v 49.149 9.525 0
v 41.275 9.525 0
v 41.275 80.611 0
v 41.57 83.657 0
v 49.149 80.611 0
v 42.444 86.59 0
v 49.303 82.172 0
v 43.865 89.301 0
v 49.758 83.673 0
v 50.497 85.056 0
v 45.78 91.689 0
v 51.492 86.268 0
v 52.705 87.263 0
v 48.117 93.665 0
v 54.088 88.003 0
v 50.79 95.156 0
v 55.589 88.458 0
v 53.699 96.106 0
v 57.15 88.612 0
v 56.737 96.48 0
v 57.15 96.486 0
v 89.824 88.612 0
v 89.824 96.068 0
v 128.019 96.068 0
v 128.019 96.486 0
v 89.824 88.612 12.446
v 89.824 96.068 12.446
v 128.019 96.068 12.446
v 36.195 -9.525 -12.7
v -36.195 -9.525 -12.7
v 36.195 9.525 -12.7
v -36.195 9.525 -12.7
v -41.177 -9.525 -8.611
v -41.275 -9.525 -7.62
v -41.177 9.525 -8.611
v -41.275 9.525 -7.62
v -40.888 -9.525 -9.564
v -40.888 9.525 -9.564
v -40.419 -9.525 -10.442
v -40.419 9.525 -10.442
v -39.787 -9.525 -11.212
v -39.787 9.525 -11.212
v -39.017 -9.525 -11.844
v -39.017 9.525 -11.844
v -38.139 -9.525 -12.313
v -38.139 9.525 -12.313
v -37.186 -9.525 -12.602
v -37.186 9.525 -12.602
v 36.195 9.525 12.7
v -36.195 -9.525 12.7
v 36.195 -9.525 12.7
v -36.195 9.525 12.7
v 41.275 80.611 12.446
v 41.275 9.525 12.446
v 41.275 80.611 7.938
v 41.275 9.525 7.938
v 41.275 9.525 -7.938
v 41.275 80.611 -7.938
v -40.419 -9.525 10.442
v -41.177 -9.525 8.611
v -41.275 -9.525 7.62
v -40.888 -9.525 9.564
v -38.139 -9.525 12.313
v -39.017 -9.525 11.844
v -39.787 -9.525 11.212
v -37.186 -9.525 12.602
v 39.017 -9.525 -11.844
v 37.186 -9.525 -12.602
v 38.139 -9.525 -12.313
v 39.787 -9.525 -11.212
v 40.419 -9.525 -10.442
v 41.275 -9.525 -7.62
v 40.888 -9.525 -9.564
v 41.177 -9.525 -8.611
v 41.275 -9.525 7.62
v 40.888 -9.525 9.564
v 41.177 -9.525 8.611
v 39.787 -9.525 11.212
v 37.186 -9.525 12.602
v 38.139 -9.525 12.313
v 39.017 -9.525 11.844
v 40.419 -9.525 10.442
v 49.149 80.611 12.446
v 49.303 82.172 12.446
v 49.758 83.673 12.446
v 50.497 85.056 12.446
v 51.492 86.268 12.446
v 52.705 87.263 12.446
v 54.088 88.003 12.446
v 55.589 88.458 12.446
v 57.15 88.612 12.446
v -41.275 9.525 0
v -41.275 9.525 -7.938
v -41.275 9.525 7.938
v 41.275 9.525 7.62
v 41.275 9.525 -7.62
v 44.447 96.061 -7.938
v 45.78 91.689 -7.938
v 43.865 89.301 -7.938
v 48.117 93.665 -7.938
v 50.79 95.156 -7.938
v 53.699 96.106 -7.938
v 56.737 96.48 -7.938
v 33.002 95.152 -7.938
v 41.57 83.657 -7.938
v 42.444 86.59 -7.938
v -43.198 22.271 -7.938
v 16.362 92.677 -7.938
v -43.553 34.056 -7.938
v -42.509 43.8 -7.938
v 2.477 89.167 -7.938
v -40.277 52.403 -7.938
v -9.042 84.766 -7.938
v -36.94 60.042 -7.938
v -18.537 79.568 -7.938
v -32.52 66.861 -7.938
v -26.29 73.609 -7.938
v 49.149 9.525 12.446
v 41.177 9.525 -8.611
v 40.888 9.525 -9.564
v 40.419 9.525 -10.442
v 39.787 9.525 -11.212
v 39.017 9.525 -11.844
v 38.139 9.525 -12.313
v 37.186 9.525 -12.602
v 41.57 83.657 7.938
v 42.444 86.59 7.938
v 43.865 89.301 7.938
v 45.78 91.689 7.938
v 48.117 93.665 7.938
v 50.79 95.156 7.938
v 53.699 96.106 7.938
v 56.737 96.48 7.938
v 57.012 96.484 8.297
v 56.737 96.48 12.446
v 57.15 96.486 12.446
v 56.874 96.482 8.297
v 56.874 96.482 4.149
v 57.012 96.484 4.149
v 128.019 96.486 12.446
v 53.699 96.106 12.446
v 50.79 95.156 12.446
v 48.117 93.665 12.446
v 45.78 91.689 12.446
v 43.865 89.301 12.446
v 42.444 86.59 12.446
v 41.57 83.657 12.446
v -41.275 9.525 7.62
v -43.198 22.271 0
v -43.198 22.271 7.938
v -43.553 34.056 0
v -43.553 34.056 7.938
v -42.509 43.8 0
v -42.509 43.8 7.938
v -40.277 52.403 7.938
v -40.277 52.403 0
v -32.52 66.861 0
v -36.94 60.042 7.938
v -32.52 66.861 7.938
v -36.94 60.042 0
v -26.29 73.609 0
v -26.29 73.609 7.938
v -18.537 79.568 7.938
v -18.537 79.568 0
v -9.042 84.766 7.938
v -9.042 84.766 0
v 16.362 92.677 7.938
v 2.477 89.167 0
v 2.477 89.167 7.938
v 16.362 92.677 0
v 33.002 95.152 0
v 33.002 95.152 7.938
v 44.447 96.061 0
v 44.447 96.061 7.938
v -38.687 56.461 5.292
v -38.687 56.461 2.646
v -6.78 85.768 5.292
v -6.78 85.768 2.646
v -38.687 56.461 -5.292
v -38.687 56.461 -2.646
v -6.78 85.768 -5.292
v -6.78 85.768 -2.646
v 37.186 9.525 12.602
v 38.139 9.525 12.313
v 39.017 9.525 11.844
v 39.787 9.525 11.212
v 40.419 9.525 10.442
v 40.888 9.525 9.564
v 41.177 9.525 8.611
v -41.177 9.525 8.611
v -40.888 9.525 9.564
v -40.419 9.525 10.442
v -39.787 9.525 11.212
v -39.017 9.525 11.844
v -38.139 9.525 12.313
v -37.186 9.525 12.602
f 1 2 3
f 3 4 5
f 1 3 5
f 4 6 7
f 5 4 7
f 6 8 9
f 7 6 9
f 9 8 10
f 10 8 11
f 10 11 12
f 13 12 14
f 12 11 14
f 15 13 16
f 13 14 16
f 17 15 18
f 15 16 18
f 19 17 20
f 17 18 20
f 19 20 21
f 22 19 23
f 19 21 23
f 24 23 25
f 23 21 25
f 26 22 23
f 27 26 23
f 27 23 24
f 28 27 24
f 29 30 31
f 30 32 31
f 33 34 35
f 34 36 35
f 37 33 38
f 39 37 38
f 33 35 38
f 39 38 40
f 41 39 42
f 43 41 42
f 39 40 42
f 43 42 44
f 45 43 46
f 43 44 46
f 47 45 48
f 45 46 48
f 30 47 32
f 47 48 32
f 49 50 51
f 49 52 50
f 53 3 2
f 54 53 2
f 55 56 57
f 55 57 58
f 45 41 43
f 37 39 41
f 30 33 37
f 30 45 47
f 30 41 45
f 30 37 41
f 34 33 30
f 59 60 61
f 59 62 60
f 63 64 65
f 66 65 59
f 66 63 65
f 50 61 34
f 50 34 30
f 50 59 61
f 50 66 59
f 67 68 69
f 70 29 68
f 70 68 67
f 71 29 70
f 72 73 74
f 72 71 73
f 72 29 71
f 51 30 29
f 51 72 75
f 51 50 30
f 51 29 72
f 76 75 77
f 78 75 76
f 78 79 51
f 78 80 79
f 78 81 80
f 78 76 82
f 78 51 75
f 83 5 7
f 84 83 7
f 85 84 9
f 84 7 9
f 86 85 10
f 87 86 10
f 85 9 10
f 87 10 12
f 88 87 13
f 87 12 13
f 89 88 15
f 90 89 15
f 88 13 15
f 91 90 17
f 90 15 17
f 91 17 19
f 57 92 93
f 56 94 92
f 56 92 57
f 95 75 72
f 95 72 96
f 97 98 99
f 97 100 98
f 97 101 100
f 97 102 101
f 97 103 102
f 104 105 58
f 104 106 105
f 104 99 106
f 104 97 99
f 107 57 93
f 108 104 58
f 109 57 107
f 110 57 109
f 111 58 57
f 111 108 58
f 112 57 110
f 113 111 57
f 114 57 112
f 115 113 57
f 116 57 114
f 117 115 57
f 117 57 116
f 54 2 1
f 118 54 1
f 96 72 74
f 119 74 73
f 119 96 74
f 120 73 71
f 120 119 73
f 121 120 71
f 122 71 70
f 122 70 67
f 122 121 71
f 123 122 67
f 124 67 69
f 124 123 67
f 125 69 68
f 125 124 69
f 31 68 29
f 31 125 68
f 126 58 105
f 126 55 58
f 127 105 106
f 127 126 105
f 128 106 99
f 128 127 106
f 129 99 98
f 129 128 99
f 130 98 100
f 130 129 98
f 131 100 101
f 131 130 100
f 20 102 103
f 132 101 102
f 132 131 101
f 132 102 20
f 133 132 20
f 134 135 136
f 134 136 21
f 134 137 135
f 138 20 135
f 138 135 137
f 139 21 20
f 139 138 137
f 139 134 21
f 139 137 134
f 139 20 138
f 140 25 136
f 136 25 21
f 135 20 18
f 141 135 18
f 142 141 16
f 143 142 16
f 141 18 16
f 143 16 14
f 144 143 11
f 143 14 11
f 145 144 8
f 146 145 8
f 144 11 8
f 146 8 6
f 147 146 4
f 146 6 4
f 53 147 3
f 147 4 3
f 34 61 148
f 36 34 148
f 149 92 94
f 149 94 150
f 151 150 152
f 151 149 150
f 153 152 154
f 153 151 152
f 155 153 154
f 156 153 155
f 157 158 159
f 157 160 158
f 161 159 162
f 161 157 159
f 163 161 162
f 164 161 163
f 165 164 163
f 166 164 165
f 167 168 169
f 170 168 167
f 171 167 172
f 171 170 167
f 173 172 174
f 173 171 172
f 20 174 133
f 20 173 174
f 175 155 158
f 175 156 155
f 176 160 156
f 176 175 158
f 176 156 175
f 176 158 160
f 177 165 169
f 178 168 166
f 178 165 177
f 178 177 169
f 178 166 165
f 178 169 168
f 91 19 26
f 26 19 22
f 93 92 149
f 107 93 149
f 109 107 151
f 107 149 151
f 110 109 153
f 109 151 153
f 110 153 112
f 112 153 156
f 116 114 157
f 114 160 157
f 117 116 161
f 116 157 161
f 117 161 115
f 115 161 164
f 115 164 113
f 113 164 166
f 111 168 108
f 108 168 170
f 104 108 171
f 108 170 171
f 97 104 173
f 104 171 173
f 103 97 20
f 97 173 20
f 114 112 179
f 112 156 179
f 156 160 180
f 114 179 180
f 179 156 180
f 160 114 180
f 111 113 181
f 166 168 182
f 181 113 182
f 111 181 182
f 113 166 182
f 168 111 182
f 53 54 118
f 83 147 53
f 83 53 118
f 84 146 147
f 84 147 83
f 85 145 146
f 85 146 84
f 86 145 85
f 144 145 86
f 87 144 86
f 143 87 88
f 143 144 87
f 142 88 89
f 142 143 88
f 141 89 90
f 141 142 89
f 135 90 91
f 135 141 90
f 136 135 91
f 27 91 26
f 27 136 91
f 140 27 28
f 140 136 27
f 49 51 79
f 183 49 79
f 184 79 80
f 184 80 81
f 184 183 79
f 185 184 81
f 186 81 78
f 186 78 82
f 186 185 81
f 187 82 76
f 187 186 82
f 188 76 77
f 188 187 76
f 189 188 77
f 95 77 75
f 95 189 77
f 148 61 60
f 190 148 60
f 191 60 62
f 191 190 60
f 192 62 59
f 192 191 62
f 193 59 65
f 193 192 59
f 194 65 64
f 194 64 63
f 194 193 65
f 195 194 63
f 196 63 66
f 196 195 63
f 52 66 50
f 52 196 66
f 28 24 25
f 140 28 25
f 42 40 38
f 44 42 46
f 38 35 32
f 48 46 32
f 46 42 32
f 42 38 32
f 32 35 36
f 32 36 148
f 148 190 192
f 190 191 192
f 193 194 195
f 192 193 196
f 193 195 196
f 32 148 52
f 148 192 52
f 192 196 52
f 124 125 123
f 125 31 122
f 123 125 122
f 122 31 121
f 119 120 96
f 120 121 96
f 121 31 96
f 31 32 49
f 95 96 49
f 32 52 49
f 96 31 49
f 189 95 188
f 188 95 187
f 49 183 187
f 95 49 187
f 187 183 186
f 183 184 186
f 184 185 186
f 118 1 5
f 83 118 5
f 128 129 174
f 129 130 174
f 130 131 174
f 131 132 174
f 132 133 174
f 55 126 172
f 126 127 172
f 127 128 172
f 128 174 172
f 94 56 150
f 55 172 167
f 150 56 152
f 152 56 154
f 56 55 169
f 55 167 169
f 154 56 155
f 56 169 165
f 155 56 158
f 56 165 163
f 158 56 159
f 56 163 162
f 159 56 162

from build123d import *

# Parameters (mm, degrees)
F0_W     = 82.55
F0_H     = 19.05
F1_DEPTH = 12.7
F2_DEPTH = 12.446
F3_DEPTH = 7.9375
F4_R     = 5.08


with BuildPart() as f1:
    # F0 (on Top) → F1 (new body, symmetric)
    with BuildSketch(Plane.XY):
        Rectangle(F0_W, F0_H)
    extrude(amount=F1_DEPTH, both=True)

    # F4
    f4_edges = [f1.edges().sort_by_distance(p)[0] for p in [
        (41.275, 0, 12.7),
        (41.275, 0, -12.7),
        (-41.275, 0, 12.7),
        (-41.275, 0, -12.7),
    ]]
    fillet(f4_edges, radius=F4_R)


with BuildPart() as f2:
    # F0 (on Top) → F2 (new body)
    with BuildSketch(Plane.XY):
        with BuildLine():
            Line((41.275, 80.61068), (41.275, 9.525))
            Line((41.275, 9.525), (49.149, 9.525))
            Line((49.149, 9.525), (49.149, 80.61068))
            ThreePointArc((49.149, 80.61068), (51.492439, 86.268242), (57.15, 88.61168))
            Line((57.15, 88.61168), (89.824399, 88.61168))
            Line((89.824399, 88.61168), (89.824399, 96.067605))
            Line((89.824399, 96.067605), (128.01899, 96.067605))
            Line((128.01899, 96.067605), (128.01899, 96.48568))
            Line((128.01899, 96.48568), (57.15, 96.48568))
            add(Edge.make_bspline(
                [(56.736729, 96.4803), (56.874336, 96.48218), (57.012093, 96.483974), (57.15, 96.48568)],
                knots=[131.1126, 131.1126, 131.1126, 131.1126, 131.337887, 131.337887, 131.337887, 131.337887], degree=3))
            ThreePointArc((56.736729, 96.4803), (45.779505, 91.688924), (41.275, 80.61068))
        make_face()
    extrude(amount=F2_DEPTH)


with BuildPart() as f3:
    # F0 (on Top) → F3 (new body, symmetric)
    with BuildSketch(Plane.XY):
        with BuildLine():
            add(Edge.make_bspline(
                [(-41.275, 9.525), (-52.583382, 64.954376), (-23.347816, 95.386158), (56.736729, 96.4803)],
                knots=[0, 0, 0, 0, 131.1126, 131.1126, 131.1126, 131.1126], degree=3))
            Line((-41.275, 9.525), (41.275, 9.525))
            Line((41.275, 9.525), (41.275, 80.61068))
            ThreePointArc((41.275, 80.61068), (45.779505, 91.688924), (56.736729, 96.4803))
        make_face()
    extrude(amount=F3_DEPTH, both=True)


solid = Compound([f1.part, f2.part, f3.part])
